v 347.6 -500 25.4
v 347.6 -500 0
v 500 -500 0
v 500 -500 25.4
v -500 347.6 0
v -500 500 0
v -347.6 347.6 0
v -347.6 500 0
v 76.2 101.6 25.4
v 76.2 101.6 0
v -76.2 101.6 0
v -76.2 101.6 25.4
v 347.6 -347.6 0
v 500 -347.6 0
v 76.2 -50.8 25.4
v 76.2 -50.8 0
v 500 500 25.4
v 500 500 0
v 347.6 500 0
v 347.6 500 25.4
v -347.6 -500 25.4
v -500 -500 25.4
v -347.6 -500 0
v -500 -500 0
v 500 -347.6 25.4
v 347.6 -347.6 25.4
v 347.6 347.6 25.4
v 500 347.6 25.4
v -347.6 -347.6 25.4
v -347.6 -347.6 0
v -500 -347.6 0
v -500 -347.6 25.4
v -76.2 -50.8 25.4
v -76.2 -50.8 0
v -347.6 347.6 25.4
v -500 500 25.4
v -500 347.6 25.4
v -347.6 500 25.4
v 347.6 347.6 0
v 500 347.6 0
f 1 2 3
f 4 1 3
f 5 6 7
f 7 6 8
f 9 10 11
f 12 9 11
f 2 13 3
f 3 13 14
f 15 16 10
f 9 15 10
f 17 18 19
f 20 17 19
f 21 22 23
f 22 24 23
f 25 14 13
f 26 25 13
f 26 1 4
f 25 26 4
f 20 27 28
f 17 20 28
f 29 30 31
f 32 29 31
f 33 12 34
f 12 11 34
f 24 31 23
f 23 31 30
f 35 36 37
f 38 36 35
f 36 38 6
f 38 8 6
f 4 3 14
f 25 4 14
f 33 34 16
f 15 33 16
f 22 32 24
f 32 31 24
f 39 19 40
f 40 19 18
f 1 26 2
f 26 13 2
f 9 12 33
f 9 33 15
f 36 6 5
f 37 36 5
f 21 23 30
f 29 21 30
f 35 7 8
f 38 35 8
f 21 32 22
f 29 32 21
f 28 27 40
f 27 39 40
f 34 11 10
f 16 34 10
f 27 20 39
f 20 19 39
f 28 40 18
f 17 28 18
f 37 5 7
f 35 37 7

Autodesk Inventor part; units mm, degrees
ref_plane "YZ Plane" through (0, 0, 0) normal (1, 0, 0) x (0, 1, 0)
ref_plane "XZ Plane" through (0, 0, 0) normal (0, 1, 0) x (-1, 0, 0)
ref_plane "XY Plane" through (0, 0, 0) normal (0, 0, 1) x (1, 0, 0)
ref_plane "Work Plane1" through (0, 0, 0) normal (0, 0, 1) x (1, 0, 0)
sketch "Sketch1" plane through (0, 0, 0) normal (0, 0, 1) x (1, 0, 0)
  line L0 (500, 500) -> (347.6, 500)
  line L1 (347.6, 500) -> (347.6, 347.6)
  line L2 (347.6, 347.6) -> (500, 347.6)
  line L3 (500, 347.6) -> (500, 500)
  line L4 (500, 500) -> (-500, 500)
  line L5 (-500, 500) -> (-500, -500)
  line L6 (-500, -500) -> (500, -500)
  line L7 (500, -500) -> (500, 500)
  line L8 (-500, 500) -> (-500, 347.6)
  line L9 (-500, 347.6) -> (-347.6, 347.6)
  line L10 (-347.6, 347.6) -> (-347.6, 500)
  line L11 (-347.6, 500) -> (-500, 500)
  line L12 (347.6, -347.6) -> (347.6, -500)
  line L13 (347.6, -500) -> (500, -500)
  line L14 (500, -500) -> (500, -347.6)
  line L15 (500, -347.6) -> (347.6, -347.6)
  line L16 (-500, -347.6) -> (-500, -500)
  line L17 (-500, -500) -> (-347.6, -500)
  line L18 (-347.6, -500) -> (-347.6, -347.6)
  line L19 (-347.6, -347.6) -> (-500, -347.6)
  line L20 (76.2, 101.6) -> (-76.2, 101.6)
  line L21 (-76.2, 101.6) -> (-76.2, -50.8)
  line L22 (-76.2, -50.8) -> (76.2, -50.8)
  line L23 (76.2, -50.8) -> (76.2, 101.6)
  point P0 (0, 0)
  dimension "d0" = 152.4
  dimension "d1" = 152.4
  dimension "d2" = 1000
  dimension "d3" = 1000
  dimension "d6" = 847.6
  dimension "d9" = 847.6
  dimension "d12" = 152.4
  dimension "d13" = 152.4
extrude "Extrusion1" add sketch "Sketch1" along normal blind 25.4 contours L3 L2 L1 L0 | L10 L9 L5 L4 | L7 L6 L12 L15 | L19 L18 L6 L5 | L23 L22 L21 L20
